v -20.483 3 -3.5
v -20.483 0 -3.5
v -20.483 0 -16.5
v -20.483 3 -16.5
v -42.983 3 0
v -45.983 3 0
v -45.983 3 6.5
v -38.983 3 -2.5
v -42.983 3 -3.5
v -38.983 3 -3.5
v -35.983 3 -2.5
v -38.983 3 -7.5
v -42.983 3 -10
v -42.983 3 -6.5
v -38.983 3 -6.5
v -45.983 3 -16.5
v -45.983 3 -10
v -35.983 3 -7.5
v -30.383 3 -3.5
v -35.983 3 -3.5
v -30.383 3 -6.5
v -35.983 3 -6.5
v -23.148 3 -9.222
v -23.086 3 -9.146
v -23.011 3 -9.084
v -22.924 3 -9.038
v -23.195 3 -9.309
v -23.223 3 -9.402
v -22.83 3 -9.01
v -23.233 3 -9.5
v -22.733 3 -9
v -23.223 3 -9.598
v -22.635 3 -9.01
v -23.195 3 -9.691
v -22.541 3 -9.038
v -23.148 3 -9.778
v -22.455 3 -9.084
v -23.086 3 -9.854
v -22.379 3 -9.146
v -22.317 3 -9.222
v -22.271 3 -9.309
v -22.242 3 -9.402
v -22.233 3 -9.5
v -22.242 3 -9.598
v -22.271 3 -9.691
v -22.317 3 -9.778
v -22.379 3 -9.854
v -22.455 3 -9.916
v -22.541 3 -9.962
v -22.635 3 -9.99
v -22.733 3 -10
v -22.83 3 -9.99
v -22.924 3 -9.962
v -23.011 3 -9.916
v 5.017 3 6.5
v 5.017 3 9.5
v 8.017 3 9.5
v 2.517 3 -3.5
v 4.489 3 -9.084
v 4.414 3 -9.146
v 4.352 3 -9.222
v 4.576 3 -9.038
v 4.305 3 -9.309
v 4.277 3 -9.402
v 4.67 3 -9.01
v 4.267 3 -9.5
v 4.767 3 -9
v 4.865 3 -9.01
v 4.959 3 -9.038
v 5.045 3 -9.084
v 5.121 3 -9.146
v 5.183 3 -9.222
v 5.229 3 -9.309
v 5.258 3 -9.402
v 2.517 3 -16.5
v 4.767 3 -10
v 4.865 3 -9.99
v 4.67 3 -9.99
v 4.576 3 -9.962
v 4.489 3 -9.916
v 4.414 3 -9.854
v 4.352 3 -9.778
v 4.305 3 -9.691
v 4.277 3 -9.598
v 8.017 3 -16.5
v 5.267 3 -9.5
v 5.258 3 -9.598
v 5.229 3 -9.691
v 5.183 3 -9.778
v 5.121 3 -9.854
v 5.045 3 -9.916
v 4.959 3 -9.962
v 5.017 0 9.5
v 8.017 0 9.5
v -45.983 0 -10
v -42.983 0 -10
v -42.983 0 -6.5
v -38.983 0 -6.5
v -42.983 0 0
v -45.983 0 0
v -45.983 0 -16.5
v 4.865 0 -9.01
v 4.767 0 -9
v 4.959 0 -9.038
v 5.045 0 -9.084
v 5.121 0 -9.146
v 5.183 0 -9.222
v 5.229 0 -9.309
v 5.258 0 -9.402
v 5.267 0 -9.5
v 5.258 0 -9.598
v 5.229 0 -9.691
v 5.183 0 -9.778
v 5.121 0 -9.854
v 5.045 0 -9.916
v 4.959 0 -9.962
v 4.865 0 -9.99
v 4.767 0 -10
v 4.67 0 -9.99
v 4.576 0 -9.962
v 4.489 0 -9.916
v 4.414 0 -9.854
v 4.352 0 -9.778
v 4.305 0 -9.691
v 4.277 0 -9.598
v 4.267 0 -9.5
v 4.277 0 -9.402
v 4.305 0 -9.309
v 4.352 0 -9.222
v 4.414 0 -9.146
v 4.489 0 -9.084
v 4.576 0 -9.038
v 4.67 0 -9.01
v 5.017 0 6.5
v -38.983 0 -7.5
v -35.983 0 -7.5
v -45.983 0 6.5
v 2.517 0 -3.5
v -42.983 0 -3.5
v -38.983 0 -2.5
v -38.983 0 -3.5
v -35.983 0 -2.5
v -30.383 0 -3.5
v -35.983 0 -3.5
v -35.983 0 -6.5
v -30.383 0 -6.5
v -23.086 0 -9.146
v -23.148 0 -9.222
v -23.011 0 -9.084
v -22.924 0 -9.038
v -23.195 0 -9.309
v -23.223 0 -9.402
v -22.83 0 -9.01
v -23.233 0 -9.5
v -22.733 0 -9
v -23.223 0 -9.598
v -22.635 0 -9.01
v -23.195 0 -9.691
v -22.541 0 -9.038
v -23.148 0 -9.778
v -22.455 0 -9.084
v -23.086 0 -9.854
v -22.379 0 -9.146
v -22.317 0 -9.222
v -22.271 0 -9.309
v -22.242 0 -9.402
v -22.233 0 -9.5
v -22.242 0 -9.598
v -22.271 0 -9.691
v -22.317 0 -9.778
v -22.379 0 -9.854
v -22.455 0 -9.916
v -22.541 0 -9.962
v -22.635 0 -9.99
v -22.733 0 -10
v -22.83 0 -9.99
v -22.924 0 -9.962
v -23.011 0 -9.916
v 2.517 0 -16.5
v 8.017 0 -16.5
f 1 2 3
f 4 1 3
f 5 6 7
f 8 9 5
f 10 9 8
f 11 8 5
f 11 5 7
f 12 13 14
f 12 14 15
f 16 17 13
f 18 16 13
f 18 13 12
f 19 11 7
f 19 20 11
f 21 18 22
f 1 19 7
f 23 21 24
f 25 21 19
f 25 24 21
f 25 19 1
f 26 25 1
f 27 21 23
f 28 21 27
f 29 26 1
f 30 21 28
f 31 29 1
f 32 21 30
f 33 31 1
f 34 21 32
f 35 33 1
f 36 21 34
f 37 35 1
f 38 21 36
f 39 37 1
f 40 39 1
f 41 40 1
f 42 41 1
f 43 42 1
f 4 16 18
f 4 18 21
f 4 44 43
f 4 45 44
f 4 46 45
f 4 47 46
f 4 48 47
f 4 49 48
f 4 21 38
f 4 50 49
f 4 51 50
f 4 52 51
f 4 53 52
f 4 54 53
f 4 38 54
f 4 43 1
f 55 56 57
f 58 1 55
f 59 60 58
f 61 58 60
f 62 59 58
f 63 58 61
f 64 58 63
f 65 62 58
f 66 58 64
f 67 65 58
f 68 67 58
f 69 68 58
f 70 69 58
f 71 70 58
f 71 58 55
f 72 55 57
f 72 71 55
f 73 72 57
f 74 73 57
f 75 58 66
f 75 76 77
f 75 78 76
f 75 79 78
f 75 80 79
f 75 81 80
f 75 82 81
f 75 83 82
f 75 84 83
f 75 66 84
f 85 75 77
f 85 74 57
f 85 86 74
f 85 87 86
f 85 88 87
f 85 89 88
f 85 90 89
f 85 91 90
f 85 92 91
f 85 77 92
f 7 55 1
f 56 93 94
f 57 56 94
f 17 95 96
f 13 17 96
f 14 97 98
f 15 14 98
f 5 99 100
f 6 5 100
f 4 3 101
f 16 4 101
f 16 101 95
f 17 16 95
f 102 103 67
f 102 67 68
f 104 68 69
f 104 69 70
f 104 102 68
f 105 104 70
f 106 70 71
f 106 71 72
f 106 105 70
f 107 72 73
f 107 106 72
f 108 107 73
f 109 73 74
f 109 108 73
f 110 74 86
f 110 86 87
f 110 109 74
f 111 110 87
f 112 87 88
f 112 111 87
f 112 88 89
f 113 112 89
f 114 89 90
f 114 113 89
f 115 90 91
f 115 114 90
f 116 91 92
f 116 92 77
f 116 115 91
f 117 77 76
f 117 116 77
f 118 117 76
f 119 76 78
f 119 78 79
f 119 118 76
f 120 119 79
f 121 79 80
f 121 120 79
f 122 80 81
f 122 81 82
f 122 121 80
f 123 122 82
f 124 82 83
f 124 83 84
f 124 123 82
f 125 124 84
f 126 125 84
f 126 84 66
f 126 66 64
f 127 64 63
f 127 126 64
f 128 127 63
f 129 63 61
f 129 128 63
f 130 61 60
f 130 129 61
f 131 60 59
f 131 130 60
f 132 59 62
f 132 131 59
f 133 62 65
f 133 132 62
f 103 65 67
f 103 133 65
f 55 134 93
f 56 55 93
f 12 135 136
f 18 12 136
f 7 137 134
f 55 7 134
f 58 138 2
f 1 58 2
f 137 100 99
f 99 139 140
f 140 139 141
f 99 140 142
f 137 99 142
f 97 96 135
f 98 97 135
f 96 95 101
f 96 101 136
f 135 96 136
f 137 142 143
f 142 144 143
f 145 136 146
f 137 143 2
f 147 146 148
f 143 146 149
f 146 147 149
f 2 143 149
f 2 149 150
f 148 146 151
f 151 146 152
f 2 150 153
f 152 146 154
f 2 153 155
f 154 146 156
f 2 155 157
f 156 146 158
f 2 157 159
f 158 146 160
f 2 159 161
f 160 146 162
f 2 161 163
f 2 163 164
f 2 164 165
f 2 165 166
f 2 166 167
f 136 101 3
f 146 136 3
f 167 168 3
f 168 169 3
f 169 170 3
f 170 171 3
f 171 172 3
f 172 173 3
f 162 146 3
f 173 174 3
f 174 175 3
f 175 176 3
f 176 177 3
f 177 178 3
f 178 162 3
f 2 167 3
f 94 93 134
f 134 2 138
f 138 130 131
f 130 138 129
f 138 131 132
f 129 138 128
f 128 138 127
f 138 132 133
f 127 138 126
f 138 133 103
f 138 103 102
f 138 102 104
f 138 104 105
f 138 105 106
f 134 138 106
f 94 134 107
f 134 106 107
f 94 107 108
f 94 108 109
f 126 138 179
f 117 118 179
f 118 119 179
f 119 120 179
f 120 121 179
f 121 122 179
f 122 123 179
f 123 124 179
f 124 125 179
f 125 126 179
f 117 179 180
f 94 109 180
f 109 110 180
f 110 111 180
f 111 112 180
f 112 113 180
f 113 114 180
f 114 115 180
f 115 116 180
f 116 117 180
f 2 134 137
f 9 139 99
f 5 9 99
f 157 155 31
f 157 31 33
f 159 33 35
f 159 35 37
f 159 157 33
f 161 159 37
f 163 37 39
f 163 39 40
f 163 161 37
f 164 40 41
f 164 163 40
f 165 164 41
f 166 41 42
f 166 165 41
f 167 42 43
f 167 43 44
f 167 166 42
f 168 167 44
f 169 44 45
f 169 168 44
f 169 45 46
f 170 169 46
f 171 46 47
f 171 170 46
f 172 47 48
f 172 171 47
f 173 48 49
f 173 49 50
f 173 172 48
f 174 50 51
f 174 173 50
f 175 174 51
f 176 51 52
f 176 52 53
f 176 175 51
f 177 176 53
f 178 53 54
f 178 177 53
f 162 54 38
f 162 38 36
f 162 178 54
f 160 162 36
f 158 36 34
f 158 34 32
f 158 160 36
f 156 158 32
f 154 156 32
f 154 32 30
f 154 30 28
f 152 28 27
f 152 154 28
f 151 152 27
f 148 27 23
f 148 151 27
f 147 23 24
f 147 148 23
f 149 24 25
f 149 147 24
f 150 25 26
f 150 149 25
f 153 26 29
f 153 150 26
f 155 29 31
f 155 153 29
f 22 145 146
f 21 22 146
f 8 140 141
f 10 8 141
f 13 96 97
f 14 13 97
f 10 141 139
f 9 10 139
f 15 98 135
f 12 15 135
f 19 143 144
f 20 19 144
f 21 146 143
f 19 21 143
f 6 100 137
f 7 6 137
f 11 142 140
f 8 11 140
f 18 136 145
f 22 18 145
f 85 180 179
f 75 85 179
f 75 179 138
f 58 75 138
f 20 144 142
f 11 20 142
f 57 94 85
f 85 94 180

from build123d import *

# Parameters (mm, degrees)
SKETCH_1_R      = 0.5
EXTRUDE_1_DEPTH = 3


with BuildPart() as part:
    # 草图1 → 凸台-拉伸1 (new body)
    with BuildSketch(Plane(origin=(0, 0, 0), x_dir=(1, 0, 0), z_dir=(0, 1, 0))):
        Polygon((-45.982728377, 0), (-45.982728377, -6.5), (5.017271623, -6.5), (5.017271623, -9.5), (8.017271623, -9.5), (8.017271623, 16.5), (2.517271623, 16.5), (2.517271623, 3.5), (-20.482728377, 3.5), (-20.482728377, 16.5), (-45.982728377, 16.5), (-45.982728377, 10), (-42.982728377, 10), (-42.982728377, 6.5), (-38.982728377, 6.5), (-38.982728377, 7.5), (-35.982728377, 7.5), (-35.982728377, 6.5), (-30.382728377, 6.5), (-30.382728377, 3.5), (-35.982728377, 3.5), (-35.982728377, 2.5), (-38.982728377, 2.5), (-38.982728377, 3.5), (-42.982728377, 3.5), (-42.982728377, 0), align=None)
        with Locations(Location((-22.732728377, 9.5, 0), (0, 0, 270))):
            Circle(SKETCH_1_R, mode=Mode.SUBTRACT)
        with Locations(Location((4.767271623, 9.5, 0), (0, 0, 270))):
            Circle(SKETCH_1_R, mode=Mode.SUBTRACT)
    extrude(amount=EXTRUDE_1_DEPTH)


solid = part.part
